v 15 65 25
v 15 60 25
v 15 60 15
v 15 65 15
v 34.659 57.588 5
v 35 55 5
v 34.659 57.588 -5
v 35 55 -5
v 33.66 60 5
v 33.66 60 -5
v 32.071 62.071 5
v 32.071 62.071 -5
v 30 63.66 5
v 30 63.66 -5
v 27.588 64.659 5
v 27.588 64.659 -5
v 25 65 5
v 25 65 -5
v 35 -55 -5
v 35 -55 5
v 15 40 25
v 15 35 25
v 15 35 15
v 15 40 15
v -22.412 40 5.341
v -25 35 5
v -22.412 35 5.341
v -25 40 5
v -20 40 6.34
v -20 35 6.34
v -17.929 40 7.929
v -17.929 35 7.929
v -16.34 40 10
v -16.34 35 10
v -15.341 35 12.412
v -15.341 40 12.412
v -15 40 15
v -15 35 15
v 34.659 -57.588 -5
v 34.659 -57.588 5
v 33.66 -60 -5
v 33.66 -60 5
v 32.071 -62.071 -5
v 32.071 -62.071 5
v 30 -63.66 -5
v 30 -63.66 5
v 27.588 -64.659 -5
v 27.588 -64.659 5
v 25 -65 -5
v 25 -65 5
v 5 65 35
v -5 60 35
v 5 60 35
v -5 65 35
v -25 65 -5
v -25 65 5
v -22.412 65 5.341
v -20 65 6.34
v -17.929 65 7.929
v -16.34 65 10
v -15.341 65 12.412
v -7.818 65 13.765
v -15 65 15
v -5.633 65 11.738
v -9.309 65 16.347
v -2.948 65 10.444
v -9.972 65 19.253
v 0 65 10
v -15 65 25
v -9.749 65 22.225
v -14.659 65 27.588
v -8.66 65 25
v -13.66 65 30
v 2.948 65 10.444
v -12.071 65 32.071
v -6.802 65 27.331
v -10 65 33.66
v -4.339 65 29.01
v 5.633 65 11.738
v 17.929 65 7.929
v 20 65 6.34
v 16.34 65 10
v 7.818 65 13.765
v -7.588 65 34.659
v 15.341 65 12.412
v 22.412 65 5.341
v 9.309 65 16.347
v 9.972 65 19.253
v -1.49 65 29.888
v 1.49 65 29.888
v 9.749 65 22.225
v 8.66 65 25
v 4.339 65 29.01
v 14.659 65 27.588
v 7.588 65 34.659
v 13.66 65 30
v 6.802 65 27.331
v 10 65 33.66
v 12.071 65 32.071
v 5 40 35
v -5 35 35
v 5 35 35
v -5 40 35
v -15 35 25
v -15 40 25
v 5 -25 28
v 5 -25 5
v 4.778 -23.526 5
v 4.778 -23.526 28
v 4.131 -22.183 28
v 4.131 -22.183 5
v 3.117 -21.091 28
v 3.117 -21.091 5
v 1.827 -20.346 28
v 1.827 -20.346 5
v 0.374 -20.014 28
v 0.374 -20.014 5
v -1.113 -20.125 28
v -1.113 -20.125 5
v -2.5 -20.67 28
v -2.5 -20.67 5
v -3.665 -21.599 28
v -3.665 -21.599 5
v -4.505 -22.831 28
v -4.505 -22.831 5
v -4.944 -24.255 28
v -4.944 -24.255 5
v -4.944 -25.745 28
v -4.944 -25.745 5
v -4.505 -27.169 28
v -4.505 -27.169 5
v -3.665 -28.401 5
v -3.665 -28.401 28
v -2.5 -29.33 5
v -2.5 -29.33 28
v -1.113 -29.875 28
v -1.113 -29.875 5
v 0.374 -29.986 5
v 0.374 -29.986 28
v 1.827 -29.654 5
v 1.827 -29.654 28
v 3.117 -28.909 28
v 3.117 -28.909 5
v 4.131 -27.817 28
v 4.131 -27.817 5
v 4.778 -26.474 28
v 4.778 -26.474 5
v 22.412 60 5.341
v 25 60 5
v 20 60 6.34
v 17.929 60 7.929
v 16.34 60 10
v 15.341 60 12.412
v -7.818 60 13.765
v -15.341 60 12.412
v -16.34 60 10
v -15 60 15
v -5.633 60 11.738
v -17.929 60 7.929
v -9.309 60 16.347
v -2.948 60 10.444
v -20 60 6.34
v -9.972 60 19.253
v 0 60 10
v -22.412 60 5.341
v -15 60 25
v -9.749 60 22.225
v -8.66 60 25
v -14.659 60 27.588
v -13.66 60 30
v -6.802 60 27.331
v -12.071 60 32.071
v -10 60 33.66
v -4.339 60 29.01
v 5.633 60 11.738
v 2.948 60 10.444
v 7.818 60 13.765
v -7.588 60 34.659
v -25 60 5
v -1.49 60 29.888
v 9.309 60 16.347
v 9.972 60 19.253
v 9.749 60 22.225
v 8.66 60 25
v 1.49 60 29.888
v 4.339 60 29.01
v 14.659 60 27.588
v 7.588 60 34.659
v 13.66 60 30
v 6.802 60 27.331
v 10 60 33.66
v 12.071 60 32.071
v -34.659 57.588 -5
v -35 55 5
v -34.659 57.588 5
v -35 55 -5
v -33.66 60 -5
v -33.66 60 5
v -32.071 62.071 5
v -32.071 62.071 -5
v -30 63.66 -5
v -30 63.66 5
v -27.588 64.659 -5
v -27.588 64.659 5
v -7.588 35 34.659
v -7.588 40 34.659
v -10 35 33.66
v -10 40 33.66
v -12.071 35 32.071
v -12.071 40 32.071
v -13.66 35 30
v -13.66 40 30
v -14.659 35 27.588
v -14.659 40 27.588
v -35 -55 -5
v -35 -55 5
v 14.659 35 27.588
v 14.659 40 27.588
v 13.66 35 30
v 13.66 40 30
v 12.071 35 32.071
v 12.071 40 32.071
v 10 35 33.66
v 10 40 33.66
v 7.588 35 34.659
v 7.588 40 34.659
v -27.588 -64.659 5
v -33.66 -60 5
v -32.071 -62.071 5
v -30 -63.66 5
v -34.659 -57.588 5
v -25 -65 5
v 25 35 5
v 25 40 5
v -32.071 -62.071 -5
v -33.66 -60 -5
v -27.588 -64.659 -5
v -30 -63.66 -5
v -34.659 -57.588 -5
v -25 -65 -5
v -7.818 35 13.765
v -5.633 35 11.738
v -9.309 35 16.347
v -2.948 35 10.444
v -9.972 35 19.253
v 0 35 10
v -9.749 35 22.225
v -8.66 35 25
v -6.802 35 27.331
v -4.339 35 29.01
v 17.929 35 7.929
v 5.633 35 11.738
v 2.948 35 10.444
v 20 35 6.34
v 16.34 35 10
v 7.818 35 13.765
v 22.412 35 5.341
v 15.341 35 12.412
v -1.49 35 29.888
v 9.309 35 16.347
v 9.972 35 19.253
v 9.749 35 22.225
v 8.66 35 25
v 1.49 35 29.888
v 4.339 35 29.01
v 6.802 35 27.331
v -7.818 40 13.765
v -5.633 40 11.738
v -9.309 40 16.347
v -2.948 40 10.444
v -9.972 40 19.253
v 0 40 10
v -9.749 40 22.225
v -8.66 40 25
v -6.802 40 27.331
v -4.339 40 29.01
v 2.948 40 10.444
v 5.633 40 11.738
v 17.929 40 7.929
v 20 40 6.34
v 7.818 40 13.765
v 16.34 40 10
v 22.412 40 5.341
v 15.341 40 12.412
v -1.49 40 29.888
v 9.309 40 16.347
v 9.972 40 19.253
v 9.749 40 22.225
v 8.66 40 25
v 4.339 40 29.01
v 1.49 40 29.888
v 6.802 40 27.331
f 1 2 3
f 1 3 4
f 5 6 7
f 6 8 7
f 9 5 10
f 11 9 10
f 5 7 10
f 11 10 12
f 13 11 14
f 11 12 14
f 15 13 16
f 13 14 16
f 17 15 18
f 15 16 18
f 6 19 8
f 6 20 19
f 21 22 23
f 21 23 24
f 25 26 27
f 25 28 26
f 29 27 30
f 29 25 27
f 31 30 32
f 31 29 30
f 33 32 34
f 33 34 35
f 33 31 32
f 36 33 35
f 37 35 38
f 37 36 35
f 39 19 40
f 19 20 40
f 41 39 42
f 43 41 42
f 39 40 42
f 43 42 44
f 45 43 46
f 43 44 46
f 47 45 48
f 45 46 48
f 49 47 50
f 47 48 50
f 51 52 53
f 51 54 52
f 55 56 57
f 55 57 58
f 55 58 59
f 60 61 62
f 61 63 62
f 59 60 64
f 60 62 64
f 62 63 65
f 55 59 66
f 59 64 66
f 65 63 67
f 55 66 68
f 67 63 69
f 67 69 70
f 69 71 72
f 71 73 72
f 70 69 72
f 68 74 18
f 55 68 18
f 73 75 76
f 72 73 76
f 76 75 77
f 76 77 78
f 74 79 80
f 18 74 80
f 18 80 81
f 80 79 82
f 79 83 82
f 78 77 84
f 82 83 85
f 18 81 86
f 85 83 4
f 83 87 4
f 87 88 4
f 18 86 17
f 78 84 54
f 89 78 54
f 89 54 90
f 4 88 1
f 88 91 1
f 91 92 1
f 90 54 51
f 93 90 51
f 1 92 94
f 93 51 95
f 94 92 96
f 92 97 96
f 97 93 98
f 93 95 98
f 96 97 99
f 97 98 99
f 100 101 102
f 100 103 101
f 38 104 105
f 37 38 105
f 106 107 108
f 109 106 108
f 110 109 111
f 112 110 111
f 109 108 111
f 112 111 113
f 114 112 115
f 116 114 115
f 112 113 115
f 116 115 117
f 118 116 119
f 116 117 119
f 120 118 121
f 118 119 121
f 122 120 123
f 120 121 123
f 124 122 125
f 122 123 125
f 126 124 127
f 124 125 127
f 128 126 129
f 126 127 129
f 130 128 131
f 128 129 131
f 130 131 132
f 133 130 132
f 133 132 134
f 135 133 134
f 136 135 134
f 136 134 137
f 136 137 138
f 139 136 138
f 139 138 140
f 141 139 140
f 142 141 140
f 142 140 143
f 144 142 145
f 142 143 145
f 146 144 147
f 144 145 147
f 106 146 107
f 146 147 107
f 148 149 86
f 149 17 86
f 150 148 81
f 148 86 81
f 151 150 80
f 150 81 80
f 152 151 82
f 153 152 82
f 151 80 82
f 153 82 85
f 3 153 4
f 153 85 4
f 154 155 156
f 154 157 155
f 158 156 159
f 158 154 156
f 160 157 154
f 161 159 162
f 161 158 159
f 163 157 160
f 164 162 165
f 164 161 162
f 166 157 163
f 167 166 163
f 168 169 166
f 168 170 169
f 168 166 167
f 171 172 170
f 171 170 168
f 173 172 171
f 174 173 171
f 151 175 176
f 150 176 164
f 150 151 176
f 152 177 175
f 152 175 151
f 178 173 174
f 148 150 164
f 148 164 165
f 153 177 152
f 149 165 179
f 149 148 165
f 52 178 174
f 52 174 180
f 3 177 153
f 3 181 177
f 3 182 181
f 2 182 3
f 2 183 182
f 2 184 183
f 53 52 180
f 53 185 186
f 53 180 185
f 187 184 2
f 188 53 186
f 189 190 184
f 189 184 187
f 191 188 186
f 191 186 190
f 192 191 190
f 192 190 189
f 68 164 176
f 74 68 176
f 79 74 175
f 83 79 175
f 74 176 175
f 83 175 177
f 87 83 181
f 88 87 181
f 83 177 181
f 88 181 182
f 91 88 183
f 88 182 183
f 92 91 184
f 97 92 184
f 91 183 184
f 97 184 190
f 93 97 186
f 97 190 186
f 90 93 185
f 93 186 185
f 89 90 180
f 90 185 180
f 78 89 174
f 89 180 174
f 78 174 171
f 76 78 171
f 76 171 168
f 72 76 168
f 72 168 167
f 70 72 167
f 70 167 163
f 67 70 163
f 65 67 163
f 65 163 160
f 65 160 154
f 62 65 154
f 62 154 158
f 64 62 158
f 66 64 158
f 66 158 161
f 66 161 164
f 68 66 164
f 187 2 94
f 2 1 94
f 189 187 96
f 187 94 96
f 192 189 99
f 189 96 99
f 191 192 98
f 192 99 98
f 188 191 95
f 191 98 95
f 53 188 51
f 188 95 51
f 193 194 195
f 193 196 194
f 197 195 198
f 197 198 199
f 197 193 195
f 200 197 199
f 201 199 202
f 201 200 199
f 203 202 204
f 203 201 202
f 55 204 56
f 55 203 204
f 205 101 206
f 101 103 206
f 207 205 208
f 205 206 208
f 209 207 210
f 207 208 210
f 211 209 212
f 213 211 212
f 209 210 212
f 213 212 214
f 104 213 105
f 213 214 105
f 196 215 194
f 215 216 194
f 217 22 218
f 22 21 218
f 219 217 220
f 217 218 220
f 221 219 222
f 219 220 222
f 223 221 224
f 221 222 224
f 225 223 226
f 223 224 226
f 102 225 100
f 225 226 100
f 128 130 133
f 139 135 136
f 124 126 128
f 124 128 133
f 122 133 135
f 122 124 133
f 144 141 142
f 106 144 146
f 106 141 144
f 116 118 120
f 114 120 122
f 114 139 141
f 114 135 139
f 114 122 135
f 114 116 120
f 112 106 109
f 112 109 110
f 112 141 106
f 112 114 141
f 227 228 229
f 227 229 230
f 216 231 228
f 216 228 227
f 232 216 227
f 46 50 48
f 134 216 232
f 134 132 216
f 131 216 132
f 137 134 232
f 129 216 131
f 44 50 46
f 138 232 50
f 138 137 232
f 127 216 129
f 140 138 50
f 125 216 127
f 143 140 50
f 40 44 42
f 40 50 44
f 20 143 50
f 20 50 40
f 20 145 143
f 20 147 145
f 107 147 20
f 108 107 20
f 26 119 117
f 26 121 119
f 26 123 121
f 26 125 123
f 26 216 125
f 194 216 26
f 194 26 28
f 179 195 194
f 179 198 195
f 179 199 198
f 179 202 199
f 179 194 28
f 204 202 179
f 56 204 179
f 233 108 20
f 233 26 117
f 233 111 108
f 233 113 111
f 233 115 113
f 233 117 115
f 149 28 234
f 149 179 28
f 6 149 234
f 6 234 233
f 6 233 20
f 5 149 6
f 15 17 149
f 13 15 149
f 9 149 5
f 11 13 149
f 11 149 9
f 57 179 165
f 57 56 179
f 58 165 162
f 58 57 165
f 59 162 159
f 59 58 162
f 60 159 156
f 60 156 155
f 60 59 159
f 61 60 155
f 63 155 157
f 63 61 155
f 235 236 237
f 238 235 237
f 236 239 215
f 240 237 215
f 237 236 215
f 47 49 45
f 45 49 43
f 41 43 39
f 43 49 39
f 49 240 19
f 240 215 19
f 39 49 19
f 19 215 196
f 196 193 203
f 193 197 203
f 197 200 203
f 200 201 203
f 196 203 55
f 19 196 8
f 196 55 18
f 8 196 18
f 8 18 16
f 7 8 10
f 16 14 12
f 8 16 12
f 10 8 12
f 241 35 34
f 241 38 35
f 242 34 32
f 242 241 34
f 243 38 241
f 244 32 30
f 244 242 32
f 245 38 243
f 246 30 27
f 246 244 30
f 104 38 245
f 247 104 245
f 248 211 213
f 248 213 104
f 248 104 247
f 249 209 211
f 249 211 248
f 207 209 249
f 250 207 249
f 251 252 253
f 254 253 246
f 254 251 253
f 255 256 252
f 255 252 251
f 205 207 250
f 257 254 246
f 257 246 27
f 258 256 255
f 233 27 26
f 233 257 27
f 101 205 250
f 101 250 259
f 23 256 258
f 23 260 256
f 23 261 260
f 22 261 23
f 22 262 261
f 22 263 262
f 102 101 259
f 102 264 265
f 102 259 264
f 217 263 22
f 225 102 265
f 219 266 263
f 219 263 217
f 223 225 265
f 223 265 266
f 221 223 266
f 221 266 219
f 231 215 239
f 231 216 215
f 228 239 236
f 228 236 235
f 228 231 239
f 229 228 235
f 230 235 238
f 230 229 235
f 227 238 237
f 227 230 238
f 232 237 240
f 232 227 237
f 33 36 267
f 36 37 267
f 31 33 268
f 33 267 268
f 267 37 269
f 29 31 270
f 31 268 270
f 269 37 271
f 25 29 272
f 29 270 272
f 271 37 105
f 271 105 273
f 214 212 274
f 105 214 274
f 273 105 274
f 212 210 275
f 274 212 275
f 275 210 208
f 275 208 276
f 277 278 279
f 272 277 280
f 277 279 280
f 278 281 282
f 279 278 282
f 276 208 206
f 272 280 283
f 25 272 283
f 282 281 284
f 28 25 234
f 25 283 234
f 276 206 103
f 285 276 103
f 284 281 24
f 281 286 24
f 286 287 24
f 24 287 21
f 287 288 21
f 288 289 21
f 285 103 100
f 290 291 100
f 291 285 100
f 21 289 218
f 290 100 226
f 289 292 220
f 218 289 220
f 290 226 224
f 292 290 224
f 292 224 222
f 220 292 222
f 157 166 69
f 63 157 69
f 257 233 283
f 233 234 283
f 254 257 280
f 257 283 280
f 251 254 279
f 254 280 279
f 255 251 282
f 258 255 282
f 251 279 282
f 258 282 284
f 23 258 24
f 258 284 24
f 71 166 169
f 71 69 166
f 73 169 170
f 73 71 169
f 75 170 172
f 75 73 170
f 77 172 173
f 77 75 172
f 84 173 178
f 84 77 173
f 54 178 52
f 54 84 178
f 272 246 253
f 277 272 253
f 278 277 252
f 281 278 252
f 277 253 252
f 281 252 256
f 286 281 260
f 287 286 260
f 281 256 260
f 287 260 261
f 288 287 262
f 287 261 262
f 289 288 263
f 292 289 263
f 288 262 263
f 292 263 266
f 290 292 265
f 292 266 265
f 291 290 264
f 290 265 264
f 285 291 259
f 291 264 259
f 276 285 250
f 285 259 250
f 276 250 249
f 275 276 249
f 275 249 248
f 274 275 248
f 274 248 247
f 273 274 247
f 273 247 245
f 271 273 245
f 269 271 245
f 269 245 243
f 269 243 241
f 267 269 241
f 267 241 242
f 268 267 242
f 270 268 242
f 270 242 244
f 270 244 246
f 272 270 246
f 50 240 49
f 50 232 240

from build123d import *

# Parameters (mm, degrees)
CROQUIS1_W              = 70
CROQUIS1_H              = 130
SALIENTE_EXTRUIR1_DEPTH = 5
REDONDEO1_R             = 10
CROQUIS2_R              = 5
SALIENTE_EXTRUIR3_DEPTH = 23
CROQUIS3_W              = 30
CROQUIS3_H              = 5
SALIENTE_EXTRUIR4_DEPTH = 30
CROQUIS5_R              = 10
CORTAR_EXTRUIR2_DEPTH   = 112.579568022
REDONDEO2_R             = 10
REDONDEO3_R             = 10


with BuildPart() as part:
    # Croquis1 → Saliente-Extruir1 (new, symmetric)
    with BuildSketch(Plane.XY):
        Rectangle(CROQUIS1_W, CROQUIS1_H)
    extrude(amount=SALIENTE_EXTRUIR1_DEPTH, both=True)

    # Redondeo1
    redondeo1_edges = [part.edges().sort_by_distance(p)[0] for p in [
        (35, -65, 0),
        (-35, -65, 0),
        (-35, 65, 0),
        (35, 65, 0),
    ]]
    fillet(redondeo1_edges, radius=REDONDEO1_R)

    # Croquis2 → Saliente-Extruir3 (add)
    with BuildSketch(Plane.XY.offset(5)):
        with Locations((0, -25)):
            Circle(CROQUIS2_R)
    extrude(amount=SALIENTE_EXTRUIR3_DEPTH)

    # Croquis3 → Saliente-Extruir4 (add)
    with BuildSketch(Plane.XY.offset(35)):
        with Locations((0, 62.5)):
            Rectangle(CROQUIS3_W, CROQUIS3_H)
        with Locations((0, 37.5)):
            Rectangle(CROQUIS3_W, CROQUIS3_H)
    extrude(amount=-SALIENTE_EXTRUIR4_DEPTH)

    # Croquis5 → Cortar-Extruir2 (cut, through all)
    with BuildSketch(Plane.XZ.offset(-35)):
        with Locations(Location((0, 20, 0), (0, 0, 270))):
            Circle(CROQUIS5_R)
    extrude(amount=-CORTAR_EXTRUIR2_DEPTH, mode=Mode.SUBTRACT)

    # Redondeo2
    redondeo2_edges = [part.edges().sort_by_distance(p)[0] for p in [
        (-15, 62.5, 5),
        (-15, 62.5, 35),
        (15, 62.5, 5),
        (15, 62.5, 35),
    ]]
    fillet(redondeo2_edges, radius=REDONDEO2_R)

    # Redondeo3
    redondeo3_edges = [part.edges().sort_by_distance(p)[0] for p in [
        (-15, 37.5, 5),
        (15, 37.5, 5),
        (-15, 37.5, 35),
        (15, 37.5, 35),
    ]]
    fillet(redondeo3_edges, radius=REDONDEO3_R)


solid = part.part
